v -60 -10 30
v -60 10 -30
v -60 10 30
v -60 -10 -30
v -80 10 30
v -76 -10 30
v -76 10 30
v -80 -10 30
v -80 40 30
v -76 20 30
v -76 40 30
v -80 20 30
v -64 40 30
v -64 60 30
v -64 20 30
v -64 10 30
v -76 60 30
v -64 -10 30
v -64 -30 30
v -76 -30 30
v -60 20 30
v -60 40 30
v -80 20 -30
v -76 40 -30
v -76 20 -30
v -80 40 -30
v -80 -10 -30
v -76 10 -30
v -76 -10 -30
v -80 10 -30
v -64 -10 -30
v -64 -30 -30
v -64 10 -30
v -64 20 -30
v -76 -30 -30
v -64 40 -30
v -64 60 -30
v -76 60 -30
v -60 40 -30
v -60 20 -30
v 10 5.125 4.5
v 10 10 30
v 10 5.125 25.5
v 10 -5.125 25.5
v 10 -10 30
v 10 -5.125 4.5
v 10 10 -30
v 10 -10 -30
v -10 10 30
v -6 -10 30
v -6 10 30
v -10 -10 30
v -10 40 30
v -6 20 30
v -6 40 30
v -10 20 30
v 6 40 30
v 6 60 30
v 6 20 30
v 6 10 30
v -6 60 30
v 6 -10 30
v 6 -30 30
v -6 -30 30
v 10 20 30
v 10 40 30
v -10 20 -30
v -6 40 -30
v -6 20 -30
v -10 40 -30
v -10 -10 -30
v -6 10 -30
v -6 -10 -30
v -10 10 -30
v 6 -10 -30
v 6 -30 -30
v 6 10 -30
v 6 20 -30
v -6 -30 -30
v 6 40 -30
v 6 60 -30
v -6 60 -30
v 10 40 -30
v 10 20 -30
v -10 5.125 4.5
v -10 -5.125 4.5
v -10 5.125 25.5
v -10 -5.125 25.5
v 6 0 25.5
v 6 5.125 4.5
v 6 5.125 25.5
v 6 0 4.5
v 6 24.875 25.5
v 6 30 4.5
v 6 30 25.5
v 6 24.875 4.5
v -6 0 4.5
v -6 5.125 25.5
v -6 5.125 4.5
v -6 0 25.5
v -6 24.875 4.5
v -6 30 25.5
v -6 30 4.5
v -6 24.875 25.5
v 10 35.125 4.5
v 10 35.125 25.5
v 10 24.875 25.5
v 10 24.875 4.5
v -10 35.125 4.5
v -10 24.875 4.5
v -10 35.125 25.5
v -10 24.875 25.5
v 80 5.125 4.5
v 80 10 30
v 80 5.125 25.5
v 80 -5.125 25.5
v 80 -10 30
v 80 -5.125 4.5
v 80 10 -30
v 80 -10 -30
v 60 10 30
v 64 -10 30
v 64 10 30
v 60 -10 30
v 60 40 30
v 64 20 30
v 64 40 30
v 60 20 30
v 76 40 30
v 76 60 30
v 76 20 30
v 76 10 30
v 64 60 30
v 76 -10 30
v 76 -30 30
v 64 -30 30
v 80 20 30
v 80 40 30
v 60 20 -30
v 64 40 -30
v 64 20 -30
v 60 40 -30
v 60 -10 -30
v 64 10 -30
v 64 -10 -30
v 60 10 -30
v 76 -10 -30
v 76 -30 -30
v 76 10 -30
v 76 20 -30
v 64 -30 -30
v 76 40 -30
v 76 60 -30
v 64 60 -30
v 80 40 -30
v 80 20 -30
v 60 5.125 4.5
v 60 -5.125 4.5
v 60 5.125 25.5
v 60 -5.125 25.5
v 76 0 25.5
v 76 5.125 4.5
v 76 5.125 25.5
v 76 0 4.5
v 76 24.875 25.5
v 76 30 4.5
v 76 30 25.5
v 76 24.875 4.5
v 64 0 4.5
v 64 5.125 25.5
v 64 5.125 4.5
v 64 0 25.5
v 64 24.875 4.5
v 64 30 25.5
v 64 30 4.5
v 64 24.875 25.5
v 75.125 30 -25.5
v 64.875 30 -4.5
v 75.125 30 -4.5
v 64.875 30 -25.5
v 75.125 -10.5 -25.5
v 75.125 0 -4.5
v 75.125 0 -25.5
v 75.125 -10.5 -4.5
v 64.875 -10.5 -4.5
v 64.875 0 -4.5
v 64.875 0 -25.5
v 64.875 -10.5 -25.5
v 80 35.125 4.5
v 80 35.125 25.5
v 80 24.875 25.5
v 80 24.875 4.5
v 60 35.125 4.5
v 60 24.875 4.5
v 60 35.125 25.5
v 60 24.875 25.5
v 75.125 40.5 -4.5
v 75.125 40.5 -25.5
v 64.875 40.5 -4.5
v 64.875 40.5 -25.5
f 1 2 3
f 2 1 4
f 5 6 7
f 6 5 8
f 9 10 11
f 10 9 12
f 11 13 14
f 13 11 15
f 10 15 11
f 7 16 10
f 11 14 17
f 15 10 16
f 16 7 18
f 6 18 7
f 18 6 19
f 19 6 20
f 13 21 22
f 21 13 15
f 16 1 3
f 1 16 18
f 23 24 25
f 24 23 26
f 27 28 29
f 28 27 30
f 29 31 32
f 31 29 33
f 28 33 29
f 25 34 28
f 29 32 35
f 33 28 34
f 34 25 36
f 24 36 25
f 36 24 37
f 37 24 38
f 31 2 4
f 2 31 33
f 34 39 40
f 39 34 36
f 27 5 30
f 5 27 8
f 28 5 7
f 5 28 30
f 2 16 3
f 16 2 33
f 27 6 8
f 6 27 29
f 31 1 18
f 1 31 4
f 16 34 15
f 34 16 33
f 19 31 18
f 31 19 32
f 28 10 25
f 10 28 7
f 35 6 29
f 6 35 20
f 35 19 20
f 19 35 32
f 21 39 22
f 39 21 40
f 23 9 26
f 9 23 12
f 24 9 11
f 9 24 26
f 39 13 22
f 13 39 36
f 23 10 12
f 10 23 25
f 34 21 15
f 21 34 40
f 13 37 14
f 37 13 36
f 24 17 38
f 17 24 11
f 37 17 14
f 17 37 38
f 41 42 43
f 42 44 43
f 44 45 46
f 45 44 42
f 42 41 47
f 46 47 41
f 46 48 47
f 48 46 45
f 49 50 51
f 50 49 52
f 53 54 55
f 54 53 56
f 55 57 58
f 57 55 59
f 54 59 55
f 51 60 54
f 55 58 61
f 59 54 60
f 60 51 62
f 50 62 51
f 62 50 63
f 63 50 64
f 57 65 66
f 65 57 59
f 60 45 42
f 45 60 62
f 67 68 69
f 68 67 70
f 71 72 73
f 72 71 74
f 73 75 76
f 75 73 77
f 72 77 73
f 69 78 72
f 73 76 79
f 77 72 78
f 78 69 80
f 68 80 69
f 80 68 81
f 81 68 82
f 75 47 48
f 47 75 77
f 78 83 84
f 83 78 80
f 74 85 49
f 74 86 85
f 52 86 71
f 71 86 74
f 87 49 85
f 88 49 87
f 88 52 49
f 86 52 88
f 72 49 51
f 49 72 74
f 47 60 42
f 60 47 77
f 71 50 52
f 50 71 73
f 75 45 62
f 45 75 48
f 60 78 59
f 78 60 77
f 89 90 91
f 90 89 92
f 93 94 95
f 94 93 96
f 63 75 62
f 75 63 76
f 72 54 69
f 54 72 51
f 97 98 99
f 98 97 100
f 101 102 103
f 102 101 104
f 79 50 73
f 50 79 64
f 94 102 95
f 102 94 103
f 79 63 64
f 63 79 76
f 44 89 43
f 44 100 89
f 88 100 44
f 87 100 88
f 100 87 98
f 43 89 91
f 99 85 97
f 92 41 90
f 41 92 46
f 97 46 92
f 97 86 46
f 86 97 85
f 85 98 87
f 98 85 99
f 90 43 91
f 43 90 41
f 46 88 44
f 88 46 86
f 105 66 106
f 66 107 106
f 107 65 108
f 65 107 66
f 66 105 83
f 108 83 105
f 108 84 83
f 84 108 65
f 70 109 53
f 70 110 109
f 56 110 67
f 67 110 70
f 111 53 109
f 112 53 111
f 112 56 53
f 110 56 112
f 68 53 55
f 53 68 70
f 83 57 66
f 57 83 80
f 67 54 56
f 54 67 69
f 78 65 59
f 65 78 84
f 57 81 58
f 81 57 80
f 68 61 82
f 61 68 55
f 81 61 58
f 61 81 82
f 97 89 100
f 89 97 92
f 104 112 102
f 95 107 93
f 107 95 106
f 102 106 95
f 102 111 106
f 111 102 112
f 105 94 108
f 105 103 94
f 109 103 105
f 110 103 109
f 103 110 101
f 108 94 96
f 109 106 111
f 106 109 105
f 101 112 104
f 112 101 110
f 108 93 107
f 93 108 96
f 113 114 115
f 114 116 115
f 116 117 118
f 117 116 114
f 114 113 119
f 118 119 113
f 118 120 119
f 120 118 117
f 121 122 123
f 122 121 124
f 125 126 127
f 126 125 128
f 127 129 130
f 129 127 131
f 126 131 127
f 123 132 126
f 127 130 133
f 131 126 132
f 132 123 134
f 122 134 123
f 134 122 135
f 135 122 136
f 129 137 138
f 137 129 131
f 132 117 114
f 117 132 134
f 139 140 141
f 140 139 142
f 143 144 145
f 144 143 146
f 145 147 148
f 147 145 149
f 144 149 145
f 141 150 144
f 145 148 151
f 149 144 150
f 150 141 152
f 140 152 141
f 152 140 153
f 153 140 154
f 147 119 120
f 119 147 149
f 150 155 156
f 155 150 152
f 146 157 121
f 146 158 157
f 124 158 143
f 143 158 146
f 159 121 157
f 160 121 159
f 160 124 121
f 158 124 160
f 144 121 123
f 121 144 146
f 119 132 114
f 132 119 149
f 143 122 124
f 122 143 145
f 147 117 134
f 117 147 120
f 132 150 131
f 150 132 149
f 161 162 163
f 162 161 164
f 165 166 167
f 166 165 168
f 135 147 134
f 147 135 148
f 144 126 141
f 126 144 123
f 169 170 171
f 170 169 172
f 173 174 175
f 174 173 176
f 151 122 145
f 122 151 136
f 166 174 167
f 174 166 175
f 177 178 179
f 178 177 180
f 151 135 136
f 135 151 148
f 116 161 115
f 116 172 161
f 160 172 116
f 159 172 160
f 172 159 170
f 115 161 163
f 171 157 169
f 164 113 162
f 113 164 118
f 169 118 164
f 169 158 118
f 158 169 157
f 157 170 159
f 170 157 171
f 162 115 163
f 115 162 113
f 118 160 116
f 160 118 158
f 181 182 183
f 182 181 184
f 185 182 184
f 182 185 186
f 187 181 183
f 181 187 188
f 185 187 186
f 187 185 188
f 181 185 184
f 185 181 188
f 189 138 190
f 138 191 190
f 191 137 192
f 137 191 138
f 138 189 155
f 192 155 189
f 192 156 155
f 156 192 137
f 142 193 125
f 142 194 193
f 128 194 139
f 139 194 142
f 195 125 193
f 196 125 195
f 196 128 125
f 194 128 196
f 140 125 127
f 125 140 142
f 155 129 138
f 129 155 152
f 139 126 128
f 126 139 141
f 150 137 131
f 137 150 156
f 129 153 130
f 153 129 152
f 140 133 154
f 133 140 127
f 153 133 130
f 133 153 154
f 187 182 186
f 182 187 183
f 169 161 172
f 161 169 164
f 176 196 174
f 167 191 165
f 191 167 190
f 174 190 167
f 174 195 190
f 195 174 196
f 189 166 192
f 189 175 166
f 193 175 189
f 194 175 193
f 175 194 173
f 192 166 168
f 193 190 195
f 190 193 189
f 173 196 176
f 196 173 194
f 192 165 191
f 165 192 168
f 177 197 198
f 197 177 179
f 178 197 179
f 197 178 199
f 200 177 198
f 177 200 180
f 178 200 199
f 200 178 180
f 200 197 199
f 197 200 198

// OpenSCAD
// Interlocking Cross Puzzle - 6 Pieces
// Classic burr puzzle — fits together in only one way
// Print 6 copies (or 2 each of 3 variants)
// Print: 0.2mm, 3 walls, 20% infill, no supports
// Tolerances tuned for PLA — reduce gap 0.05 for resin

L     = 60;   // Piece length
W     = 20;   // Cross width
NOTCH = W / 2;
GAP   = 0.25; // Assembly clearance

module base_piece() {
    // + shaped cross-section, length L
    union() {
        cube([W, W, L], center = true);
        cube([W * 0.6, W * 3, L], center = true);
    }
}

// Piece A — straight through
module piece_A() {
    base_piece();
}

// Piece B — single notch
module piece_B() {
    difference() {
        base_piece();
        translate([0, 0, L/4])
            cube([W + 1, NOTCH + GAP, W + 1], center = true);
    }
}

// Piece C — double notch (the key piece)
module piece_C() {
    difference() {
        base_piece();
        translate([0, 0,  L/4]) cube([W + 1, NOTCH + GAP, W + 1], center = true);
        translate([0, 0, -L/4]) cube([NOTCH + GAP, W + 1, W + 1], center = true);
    }
}

// Layout all 6 pieces for printing
translate([-70,  0, 0]) piece_A();
translate([-70, 30, 0]) piece_A();
translate([  0,  0, 0]) piece_B();
translate([  0, 30, 0]) piece_B();
translate([ 70,  0, 0]) piece_C();
translate([ 70, 30, 0]) piece_C();
